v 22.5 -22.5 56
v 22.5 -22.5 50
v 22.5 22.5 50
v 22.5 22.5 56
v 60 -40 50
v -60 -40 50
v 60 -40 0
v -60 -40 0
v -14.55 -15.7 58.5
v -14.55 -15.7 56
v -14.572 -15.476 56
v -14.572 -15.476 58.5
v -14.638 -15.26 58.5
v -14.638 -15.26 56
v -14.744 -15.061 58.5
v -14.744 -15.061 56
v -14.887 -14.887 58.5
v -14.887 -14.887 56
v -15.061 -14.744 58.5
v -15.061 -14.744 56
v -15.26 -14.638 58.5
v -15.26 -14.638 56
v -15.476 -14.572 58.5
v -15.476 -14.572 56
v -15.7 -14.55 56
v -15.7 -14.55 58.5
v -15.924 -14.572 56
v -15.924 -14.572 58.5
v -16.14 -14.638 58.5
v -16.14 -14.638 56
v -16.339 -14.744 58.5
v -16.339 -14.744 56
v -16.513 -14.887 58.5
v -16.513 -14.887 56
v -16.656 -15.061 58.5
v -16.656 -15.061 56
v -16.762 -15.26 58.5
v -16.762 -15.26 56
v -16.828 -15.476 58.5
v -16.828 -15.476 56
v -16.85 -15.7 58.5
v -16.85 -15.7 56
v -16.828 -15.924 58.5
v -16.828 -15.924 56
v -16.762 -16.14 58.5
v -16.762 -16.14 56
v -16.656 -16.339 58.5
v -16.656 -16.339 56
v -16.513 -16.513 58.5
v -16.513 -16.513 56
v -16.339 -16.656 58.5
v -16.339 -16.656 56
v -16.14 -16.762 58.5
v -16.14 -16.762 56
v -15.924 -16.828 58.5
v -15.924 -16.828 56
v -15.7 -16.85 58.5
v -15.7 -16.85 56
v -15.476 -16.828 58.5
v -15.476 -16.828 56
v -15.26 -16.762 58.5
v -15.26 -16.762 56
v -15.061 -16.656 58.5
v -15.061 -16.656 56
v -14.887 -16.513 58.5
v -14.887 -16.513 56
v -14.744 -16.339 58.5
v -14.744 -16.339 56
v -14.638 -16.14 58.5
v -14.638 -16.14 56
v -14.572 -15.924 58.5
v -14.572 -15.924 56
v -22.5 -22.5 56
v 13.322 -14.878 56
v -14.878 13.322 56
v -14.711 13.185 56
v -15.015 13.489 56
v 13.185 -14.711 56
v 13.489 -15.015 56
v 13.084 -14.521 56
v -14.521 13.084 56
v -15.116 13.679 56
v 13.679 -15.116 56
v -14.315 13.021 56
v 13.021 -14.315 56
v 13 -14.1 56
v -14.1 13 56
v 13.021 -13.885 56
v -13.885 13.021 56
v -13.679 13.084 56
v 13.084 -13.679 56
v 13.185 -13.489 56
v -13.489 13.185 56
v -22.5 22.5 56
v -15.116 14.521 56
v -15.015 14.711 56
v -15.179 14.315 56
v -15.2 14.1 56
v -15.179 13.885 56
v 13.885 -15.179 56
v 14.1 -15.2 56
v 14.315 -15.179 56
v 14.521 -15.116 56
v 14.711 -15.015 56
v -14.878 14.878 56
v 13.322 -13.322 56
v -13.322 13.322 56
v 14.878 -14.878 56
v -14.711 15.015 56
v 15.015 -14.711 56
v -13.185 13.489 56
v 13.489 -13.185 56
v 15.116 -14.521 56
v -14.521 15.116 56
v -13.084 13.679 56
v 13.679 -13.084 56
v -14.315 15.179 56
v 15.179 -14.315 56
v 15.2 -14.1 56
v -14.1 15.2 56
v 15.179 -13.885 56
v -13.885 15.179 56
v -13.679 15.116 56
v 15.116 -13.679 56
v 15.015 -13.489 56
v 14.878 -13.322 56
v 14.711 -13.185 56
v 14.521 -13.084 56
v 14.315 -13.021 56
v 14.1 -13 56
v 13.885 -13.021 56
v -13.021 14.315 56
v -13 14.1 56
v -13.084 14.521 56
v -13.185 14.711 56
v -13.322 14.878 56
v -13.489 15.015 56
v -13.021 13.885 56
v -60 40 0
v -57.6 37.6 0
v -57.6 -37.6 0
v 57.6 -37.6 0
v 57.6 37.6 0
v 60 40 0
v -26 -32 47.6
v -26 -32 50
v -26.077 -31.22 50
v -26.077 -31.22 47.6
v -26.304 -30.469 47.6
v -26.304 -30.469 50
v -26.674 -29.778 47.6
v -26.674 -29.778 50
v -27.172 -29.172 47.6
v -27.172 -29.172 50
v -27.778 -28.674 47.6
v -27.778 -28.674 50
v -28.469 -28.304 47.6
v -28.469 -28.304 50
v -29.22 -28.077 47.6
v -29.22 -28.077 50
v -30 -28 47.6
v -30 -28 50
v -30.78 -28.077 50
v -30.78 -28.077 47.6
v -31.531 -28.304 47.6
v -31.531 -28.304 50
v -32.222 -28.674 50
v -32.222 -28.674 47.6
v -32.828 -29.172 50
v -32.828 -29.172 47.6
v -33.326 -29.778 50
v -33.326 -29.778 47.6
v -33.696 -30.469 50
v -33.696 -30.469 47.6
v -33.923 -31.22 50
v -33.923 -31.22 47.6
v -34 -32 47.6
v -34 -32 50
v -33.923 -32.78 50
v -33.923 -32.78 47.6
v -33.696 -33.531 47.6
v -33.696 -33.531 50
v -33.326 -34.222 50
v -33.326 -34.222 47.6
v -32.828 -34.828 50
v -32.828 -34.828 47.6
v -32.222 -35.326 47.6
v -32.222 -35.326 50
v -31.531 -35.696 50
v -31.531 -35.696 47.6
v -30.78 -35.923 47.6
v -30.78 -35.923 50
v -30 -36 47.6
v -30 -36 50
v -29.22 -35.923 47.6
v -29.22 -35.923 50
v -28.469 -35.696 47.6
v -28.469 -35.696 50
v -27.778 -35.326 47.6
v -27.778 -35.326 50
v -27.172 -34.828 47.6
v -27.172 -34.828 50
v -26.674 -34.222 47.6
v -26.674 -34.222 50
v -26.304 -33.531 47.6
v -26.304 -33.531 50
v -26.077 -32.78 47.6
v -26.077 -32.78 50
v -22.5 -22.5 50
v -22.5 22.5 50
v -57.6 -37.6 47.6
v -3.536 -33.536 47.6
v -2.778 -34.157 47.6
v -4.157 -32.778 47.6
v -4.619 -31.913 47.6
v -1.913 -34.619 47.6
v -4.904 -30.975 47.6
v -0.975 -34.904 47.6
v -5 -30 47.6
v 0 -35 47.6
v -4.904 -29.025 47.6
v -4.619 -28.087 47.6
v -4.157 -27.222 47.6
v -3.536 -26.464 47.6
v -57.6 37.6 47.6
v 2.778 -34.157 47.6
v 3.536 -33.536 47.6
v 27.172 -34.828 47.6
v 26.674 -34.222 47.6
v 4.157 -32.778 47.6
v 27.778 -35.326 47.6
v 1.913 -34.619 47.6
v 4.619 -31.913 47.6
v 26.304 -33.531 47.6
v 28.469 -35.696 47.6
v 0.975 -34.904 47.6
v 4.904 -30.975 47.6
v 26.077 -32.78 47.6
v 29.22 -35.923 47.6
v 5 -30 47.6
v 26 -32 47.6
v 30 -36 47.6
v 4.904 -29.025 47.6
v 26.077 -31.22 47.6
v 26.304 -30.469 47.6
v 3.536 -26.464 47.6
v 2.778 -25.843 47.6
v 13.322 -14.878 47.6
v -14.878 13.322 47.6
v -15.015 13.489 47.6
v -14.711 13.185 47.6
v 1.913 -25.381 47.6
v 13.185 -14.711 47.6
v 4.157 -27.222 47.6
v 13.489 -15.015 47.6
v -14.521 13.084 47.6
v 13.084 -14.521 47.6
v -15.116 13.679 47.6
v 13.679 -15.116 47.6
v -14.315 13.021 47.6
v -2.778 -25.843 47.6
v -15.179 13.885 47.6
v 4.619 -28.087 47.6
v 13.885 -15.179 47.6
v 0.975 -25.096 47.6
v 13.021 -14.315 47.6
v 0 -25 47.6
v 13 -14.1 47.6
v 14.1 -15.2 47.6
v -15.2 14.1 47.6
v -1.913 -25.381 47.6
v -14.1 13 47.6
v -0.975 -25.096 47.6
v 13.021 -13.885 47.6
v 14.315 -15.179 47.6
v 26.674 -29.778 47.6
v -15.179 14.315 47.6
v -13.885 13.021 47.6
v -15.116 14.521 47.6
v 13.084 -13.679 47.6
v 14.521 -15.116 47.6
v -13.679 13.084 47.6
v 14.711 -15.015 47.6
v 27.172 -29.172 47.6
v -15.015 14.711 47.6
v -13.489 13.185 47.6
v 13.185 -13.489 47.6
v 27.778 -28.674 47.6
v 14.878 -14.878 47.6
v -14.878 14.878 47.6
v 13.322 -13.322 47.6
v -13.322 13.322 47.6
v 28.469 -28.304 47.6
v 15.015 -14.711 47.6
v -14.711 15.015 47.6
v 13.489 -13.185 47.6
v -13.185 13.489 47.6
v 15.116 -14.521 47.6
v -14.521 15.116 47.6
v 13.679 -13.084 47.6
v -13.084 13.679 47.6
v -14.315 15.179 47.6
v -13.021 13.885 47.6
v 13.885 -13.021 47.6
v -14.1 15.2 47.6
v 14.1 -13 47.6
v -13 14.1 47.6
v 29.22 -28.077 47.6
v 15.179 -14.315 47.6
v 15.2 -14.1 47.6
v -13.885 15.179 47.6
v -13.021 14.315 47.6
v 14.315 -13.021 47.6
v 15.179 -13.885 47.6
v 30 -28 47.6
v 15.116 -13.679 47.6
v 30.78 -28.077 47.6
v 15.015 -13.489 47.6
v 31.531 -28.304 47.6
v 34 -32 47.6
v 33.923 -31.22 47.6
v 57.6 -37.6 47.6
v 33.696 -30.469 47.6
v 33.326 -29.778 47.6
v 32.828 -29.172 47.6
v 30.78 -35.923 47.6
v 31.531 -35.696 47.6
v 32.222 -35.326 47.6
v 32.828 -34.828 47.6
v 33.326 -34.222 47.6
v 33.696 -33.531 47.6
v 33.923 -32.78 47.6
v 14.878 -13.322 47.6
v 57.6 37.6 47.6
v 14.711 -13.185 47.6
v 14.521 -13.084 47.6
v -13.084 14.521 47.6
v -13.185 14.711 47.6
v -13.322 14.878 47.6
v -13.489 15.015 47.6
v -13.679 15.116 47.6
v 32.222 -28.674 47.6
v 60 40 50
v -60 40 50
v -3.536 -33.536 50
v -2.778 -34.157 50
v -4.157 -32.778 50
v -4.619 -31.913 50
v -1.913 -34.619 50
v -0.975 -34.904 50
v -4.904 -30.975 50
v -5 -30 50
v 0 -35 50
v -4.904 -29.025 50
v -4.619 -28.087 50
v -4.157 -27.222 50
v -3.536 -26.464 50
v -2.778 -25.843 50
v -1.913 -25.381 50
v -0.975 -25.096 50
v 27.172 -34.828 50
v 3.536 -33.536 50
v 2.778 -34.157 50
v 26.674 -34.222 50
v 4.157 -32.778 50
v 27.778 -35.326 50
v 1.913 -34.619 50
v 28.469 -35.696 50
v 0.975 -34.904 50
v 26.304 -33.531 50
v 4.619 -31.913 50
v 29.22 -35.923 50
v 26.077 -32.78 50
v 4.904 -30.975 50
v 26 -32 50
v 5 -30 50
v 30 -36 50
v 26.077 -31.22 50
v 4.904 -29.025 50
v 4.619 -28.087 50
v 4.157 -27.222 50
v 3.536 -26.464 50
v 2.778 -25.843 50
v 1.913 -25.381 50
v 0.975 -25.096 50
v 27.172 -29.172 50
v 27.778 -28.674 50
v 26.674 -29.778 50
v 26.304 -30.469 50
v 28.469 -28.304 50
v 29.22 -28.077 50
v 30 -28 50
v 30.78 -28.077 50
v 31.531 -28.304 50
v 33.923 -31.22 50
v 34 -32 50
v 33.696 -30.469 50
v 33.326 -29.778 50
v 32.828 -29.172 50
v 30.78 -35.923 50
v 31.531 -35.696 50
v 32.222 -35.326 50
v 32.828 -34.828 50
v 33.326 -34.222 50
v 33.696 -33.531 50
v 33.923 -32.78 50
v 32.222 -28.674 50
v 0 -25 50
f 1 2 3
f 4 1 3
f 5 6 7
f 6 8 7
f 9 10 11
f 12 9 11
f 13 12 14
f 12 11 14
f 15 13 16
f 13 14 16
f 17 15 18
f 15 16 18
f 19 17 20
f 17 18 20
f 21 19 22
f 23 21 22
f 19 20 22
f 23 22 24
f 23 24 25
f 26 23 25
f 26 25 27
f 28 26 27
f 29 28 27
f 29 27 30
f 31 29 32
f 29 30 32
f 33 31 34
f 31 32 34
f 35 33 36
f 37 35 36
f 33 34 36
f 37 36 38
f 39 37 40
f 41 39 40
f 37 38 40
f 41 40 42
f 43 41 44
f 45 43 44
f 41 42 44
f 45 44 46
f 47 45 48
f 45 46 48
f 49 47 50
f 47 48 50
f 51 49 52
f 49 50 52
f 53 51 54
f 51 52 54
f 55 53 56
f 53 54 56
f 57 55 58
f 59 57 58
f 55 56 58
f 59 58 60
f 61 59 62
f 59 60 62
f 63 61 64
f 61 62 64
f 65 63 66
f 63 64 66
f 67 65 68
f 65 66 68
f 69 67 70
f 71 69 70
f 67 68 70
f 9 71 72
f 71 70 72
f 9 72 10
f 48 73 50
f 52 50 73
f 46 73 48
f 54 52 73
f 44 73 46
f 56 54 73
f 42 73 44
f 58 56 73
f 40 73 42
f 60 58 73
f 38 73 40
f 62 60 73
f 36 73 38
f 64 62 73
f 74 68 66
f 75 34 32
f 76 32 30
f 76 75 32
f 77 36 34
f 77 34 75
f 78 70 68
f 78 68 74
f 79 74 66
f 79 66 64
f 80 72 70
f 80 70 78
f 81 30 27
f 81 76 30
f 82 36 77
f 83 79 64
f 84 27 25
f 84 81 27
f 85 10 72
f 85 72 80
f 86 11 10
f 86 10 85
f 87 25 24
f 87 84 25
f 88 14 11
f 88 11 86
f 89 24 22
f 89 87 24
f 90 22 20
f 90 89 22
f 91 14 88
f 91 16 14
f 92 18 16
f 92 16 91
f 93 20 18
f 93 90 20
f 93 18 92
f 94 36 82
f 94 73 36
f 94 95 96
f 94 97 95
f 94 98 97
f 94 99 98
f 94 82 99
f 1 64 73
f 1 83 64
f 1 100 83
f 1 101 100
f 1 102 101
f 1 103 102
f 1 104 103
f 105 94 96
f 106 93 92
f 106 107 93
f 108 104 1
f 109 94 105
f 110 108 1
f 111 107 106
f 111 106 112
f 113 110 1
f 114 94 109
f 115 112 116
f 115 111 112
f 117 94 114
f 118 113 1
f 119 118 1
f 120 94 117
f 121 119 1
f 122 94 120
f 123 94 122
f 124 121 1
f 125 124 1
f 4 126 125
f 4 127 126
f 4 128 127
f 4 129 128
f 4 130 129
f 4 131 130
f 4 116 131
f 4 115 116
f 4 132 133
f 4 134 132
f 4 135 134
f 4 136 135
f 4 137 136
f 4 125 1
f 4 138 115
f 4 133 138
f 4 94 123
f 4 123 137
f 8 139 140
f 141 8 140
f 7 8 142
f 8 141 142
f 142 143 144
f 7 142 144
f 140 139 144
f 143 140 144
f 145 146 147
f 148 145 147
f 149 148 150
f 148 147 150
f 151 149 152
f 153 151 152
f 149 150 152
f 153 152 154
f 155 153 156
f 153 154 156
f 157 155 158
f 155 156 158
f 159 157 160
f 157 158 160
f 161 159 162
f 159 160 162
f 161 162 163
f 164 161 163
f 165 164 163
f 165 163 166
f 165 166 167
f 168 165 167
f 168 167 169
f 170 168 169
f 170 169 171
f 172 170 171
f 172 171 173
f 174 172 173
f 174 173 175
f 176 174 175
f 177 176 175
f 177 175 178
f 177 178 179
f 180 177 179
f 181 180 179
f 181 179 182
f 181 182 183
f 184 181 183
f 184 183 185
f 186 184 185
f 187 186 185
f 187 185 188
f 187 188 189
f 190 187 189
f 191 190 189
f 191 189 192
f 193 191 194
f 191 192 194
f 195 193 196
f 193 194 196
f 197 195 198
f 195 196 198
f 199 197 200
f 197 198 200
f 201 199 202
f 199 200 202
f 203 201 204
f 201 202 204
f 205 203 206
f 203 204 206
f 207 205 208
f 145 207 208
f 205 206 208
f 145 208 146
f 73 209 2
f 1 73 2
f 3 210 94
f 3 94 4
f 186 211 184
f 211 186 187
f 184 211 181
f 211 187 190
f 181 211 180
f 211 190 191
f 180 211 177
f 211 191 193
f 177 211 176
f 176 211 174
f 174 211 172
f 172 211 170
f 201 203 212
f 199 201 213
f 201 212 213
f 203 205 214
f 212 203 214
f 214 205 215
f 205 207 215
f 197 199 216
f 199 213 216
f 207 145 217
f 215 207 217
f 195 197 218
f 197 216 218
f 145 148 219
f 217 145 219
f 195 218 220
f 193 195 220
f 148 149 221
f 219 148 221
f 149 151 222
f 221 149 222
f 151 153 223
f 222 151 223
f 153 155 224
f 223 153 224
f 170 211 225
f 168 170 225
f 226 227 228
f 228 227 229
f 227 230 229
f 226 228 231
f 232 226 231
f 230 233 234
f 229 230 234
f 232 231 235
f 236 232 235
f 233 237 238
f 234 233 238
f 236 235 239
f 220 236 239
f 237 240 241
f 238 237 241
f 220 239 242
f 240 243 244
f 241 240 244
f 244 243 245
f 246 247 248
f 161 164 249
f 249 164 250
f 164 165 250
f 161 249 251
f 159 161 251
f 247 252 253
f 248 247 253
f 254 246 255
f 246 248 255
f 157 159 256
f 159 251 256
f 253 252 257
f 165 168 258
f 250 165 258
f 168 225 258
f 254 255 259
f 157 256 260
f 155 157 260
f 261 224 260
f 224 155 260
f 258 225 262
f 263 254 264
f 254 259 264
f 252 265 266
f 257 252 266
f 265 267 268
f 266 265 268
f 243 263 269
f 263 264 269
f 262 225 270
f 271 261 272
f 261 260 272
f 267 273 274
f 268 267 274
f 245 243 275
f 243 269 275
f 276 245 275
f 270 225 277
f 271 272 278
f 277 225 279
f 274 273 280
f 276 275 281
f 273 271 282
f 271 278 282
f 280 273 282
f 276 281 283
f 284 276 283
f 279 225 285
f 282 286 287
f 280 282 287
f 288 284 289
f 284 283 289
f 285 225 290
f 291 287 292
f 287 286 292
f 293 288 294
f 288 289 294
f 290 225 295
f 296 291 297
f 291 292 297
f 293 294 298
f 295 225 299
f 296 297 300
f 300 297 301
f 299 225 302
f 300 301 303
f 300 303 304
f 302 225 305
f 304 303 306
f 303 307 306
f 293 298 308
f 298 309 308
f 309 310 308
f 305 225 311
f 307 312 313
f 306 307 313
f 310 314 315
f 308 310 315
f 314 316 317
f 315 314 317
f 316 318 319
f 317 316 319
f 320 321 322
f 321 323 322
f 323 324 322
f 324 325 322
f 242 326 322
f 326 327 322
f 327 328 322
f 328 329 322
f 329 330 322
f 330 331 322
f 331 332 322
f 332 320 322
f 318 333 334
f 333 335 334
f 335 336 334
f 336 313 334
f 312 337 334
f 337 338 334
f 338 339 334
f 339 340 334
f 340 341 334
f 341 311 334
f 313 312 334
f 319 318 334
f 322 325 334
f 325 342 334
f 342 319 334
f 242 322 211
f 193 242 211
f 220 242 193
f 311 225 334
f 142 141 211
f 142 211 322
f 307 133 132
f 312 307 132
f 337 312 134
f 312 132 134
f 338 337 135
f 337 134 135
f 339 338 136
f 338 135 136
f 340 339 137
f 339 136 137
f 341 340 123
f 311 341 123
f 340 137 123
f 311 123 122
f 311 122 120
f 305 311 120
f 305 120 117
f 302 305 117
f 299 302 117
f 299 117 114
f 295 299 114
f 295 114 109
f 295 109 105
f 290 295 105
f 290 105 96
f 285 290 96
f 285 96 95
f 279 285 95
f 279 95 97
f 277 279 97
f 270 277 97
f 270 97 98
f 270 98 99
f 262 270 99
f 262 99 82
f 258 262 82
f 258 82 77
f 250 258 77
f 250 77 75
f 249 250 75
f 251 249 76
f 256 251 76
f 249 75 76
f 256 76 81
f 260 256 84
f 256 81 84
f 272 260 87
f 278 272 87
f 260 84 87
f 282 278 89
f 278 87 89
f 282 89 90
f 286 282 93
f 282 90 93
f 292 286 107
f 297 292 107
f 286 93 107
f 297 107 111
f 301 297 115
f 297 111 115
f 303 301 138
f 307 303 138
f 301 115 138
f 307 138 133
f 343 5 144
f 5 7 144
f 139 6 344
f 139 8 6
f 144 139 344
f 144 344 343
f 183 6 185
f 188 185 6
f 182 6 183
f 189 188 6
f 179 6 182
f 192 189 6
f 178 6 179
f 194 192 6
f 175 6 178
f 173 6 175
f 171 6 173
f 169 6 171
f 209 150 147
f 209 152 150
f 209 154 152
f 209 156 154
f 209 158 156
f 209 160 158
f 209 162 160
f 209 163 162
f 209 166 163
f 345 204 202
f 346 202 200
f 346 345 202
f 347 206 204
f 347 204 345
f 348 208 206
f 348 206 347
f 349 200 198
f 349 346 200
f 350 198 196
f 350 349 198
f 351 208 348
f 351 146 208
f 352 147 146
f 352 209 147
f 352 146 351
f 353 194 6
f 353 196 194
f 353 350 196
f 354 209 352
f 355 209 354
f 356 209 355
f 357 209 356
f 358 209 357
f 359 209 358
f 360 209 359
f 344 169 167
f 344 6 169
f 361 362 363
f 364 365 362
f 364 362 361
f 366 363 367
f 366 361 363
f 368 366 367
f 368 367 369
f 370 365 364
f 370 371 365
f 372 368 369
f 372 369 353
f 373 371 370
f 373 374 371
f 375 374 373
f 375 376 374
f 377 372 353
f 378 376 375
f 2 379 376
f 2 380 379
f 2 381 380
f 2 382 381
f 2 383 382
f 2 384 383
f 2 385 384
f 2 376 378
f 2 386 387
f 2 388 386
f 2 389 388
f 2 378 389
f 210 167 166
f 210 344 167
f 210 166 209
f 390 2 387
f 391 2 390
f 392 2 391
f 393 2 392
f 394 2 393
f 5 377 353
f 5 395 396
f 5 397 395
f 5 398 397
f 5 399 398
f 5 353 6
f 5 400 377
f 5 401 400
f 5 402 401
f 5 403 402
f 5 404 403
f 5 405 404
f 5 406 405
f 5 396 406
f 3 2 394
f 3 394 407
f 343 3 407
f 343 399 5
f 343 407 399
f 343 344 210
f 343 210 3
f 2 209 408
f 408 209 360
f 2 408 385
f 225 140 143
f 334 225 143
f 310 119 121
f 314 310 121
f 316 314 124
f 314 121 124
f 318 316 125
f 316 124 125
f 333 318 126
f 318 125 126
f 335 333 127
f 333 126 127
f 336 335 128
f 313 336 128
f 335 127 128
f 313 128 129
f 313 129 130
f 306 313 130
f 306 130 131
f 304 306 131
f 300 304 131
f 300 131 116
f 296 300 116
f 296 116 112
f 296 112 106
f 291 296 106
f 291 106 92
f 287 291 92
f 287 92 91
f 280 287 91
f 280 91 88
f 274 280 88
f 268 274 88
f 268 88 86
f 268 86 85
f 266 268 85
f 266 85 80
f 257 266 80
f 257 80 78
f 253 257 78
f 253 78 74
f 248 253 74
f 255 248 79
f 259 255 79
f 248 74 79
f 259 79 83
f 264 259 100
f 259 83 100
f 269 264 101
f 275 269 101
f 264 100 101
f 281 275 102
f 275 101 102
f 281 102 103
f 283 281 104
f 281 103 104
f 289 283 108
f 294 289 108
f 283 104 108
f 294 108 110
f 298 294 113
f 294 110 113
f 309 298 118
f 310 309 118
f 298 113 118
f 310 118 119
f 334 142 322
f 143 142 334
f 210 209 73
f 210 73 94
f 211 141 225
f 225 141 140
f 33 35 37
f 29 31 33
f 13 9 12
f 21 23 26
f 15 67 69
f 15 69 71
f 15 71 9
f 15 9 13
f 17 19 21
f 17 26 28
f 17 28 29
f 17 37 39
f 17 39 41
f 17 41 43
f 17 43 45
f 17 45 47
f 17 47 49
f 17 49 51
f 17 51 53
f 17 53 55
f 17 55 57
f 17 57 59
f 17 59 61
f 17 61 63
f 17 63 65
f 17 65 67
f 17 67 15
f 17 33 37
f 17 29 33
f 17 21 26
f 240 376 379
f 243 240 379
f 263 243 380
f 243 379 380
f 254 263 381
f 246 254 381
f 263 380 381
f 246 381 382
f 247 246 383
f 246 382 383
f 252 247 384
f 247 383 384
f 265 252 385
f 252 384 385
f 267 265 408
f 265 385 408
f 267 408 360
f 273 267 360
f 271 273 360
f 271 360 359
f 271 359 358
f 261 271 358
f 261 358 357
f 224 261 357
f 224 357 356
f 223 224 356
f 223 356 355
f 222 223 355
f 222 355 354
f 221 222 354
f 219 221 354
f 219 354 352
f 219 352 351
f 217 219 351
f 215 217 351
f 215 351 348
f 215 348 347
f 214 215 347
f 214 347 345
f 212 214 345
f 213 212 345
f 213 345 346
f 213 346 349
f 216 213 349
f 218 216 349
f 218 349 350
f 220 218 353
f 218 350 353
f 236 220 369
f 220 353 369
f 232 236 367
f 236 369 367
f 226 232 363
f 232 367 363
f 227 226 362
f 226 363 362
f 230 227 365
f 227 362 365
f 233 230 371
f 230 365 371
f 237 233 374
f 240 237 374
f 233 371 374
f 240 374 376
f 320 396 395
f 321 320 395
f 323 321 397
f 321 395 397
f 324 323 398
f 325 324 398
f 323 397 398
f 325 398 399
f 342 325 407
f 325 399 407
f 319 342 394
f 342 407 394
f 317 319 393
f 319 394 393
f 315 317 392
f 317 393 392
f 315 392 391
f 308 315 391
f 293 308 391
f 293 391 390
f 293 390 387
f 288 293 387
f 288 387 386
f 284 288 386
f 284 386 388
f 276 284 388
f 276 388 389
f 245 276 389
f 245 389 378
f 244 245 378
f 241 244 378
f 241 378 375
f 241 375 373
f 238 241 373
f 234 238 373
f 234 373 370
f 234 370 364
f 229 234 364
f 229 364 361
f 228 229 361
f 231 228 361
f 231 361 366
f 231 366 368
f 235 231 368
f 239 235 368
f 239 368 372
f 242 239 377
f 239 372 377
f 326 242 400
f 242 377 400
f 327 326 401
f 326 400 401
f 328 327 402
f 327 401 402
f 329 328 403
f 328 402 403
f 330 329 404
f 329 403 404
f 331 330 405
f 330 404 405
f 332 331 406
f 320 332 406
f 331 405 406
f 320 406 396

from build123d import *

# Parameters (mm, degrees)
SKETCH1_W           = 120
SKETCH1_H           = 80
SKETCH1_W_2         = 115.2
SKETCH1_H_2         = 75.2
BOSS_EXTRUDE1_DEPTH = 47.6
SKETCH2_W           = 120
SKETCH2_H           = 80
BOSS_EXTRUDE2_DEPTH = 2.4
SKETCH3_W           = 45
SKETCH3_H           = 45
BOSS_EXTRUDE3_DEPTH = 6
SKETCH4_R           = 1.1
CUT_EXTRUDE1_DEPTH  = 92.301697684
SKETCH5_R           = 1.15
BOSS_EXTRUDE4_DEPTH = 2.5
SKETCH6_R           = 4
SKETCH6_R_2         = 5
CUT_EXTRUDE2_DEPTH  = 3


with BuildPart() as part:
    # Sketch1 → Boss-Extrude1 (new body)
    with BuildSketch(Plane.XY):
        Rectangle(SKETCH1_W, SKETCH1_H)
        Rectangle(SKETCH1_W_2, SKETCH1_H_2, mode=Mode.SUBTRACT)
    extrude(amount=BOSS_EXTRUDE1_DEPTH)

    # Sketch2 → Boss-Extrude2 (add)
    with BuildSketch(Plane.XY.offset(47.6)):
        Rectangle(SKETCH2_W, SKETCH2_H)
    extrude(amount=BOSS_EXTRUDE2_DEPTH)

    # Sketch3 → Boss-Extrude3 (add)
    with BuildSketch(Plane.XY.offset(50)):
        Rectangle(SKETCH3_W, SKETCH3_H)
    extrude(amount=BOSS_EXTRUDE3_DEPTH)

    # Sketch4 → Cut-Extrude1 (cut, through all)
    with BuildSketch(Plane.XY.offset(56)):
        with Locations((-14.1, 14.1)):
            Circle(SKETCH4_R)
        with Locations((14.1, -14.1)):
            Circle(SKETCH4_R)
    extrude(amount=-CUT_EXTRUDE1_DEPTH, mode=Mode.SUBTRACT)

    # Sketch5 → Boss-Extrude4 (add)
    with BuildSketch(Plane.XY.offset(56)):
        with Locations((-15.7, -15.7)):
            Circle(SKETCH5_R)
    extrude(amount=BOSS_EXTRUDE4_DEPTH)

    # Sketch6 → Cut-Extrude2 (cut)
    with BuildSketch(Plane.XY.offset(50)):
        with Locations((-30, -32)):
            Circle(SKETCH6_R)
        with Locations((30, -32)):
            Circle(SKETCH6_R)
        with Locations((0, -30)):
            Circle(SKETCH6_R_2)
    extrude(amount=-CUT_EXTRUDE2_DEPTH, mode=Mode.SUBTRACT)


solid = part.part
